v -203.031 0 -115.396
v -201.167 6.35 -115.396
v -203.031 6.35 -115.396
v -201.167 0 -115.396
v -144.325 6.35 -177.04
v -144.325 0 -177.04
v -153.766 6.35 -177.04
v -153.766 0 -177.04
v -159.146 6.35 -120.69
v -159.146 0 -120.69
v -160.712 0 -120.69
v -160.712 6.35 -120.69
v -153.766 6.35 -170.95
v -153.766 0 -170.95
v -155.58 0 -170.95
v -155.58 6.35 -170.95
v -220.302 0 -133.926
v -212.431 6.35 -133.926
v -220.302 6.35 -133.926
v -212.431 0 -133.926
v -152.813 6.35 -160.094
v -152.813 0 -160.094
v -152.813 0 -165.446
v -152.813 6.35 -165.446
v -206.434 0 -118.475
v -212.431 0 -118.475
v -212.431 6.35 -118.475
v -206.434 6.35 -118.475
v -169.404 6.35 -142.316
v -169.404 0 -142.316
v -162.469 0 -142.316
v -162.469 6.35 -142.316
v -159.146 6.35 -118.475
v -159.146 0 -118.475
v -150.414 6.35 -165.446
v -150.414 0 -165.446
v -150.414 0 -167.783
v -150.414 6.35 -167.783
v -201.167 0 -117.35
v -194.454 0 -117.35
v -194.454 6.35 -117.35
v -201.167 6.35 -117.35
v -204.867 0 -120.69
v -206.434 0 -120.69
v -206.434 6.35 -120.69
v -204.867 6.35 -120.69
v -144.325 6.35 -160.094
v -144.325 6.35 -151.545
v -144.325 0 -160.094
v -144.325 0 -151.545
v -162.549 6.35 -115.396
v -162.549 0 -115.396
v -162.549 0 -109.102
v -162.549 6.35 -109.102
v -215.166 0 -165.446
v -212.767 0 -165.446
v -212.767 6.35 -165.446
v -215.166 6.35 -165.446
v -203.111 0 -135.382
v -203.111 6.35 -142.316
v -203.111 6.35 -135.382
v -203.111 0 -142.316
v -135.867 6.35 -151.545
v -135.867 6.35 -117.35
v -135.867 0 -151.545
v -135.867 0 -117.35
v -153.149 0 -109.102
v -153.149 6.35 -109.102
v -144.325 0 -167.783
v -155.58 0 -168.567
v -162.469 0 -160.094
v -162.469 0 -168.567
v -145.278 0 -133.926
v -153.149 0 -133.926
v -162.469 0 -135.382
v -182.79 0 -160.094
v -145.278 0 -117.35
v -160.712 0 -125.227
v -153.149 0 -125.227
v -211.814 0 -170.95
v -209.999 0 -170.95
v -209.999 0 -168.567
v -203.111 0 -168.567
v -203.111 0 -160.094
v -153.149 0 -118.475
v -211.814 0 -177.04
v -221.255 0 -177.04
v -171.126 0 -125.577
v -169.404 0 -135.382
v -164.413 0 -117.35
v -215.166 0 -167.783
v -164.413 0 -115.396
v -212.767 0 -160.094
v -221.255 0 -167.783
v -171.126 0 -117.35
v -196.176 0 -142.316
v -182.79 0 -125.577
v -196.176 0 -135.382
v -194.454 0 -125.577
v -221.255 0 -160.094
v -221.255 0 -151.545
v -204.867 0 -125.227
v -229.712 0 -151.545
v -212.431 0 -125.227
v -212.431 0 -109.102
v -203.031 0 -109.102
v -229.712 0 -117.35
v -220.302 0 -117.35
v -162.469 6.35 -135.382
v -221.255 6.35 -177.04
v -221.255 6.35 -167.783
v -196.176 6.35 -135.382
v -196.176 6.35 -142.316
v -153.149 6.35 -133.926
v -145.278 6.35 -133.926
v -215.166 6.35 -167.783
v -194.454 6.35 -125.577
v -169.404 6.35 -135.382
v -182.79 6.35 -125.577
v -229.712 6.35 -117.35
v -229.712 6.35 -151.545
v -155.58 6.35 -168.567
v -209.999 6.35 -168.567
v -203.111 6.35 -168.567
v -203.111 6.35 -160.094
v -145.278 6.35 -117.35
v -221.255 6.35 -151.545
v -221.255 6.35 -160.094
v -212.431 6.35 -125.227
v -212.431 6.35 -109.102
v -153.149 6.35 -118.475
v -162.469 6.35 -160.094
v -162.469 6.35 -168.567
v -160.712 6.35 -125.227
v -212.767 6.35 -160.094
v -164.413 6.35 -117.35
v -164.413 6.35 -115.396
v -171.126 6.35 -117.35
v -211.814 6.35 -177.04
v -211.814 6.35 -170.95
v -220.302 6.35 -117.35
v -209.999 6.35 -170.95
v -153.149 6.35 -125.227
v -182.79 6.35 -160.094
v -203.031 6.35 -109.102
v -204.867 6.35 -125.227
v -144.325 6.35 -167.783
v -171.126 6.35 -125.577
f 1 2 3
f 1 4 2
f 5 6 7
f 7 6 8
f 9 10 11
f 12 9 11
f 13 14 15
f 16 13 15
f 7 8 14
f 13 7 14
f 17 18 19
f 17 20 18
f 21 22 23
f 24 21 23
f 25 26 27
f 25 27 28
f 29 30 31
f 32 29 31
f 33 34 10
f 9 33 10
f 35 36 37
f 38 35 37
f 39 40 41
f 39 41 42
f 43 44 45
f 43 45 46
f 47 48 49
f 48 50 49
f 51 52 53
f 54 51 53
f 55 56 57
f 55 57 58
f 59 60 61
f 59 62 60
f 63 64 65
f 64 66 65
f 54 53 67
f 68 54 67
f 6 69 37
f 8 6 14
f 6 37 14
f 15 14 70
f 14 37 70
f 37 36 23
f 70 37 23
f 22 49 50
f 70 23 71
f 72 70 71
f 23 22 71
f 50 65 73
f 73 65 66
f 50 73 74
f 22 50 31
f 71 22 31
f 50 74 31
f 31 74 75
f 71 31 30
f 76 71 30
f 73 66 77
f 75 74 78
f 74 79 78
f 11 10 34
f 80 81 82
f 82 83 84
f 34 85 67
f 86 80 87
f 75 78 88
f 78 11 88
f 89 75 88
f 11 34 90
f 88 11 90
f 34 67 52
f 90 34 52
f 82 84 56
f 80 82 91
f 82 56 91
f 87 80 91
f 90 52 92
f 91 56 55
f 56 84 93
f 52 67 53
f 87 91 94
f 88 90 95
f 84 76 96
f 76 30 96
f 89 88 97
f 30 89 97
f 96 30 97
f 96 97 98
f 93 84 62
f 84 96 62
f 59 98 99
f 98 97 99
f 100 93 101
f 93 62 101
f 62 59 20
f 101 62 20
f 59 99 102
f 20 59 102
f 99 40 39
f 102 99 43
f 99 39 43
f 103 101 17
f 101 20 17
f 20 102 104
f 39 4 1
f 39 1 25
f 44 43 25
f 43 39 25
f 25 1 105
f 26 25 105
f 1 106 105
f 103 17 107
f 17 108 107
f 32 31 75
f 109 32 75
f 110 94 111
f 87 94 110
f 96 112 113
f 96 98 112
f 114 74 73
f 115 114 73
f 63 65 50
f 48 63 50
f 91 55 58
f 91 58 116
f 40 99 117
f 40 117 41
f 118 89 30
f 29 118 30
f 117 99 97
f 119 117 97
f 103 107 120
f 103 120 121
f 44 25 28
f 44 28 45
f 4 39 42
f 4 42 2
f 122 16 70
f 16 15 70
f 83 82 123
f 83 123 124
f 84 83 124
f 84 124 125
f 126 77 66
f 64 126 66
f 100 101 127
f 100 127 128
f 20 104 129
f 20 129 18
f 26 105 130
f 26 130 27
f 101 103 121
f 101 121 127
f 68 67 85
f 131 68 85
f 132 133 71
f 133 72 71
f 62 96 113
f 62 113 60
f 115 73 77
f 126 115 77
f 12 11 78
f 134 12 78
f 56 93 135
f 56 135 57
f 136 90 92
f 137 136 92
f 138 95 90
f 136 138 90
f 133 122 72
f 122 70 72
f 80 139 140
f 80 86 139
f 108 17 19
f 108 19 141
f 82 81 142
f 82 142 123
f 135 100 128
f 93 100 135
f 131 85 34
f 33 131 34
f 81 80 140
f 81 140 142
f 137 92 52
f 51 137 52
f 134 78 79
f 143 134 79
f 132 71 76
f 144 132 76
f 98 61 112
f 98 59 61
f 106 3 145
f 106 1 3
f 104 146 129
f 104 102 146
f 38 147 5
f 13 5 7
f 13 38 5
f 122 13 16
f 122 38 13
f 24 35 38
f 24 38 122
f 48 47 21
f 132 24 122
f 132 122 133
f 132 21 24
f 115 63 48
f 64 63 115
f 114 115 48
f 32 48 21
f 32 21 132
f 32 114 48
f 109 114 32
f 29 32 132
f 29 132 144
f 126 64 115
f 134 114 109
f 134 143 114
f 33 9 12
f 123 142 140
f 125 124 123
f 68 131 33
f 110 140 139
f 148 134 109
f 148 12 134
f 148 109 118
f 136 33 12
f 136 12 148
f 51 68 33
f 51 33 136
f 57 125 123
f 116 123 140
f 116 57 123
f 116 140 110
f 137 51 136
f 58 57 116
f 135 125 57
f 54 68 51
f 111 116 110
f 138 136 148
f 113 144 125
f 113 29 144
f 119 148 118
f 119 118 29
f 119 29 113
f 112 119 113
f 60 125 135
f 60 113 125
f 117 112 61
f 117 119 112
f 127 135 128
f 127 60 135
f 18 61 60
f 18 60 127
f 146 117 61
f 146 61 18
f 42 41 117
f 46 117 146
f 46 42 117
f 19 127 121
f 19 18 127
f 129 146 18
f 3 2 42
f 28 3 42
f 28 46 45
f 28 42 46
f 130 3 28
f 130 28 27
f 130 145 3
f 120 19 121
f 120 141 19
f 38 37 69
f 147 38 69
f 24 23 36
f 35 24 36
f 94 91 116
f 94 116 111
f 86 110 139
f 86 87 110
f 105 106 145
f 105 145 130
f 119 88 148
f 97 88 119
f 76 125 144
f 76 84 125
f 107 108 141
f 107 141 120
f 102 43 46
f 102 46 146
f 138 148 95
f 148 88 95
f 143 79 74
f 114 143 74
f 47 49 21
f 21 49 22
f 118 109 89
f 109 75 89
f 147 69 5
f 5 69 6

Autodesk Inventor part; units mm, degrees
ref_plane "YZ Plane" through (0, 0, 0) normal (1, 0, 0) x (0, 1, 0)
ref_plane "XZ Plane" through (0, 0, 0) normal (0, 1, 0) x (-1, 0, 0)
ref_plane "XY Plane" through (0, 0, 0) normal (0, 0, 1) x (1, 0, 0)
sketch "Sketch1" plane through (0, 0, 0) normal (0, 1, 0) x (-1, 0, 0)
  line L0 (0, 0) -> (441.3397, 0) construction
  line L1 (441.3397, 0) -> (441.3397, -197.552) construction
  line L2 (441.3397, -197.552) -> (0, -197.552) construction
  line L3 (0, -197.552) -> (0, 0) construction
  line L4 (171.126, -125.5766) -> (171.126, -117.3504)
  line L5 (171.126, -117.3504) -> (164.413, -117.3504)
  line L6 (164.413, -117.3504) -> (164.413, -115.3958)
  line L7 (164.413, -115.3958) -> (162.5492, -115.3958)
  line L8 (162.5492, -115.3958) -> (162.5492, -109.1021)
  line L9 (162.5492, -109.1021) -> (153.1492, -109.1021)
  line L10 (153.1492, -109.1021) -> (153.1492, -118.4751)
  line L11 (153.1492, -118.4751) -> (159.1458, -118.4751)
  line L12 (159.1458, -118.4751) -> (159.1458, -120.6901)
  line L13 (159.1458, -120.6901) -> (160.7124, -120.6901)
  line L14 (160.7124, -120.6901) -> (160.7124, -125.2266)
  line L15 (160.7124, -125.2266) -> (153.1492, -125.2266)
  line L16 (153.1492, -125.2266) -> (153.1492, -133.9258)
  line L17 (153.1492, -133.9258) -> (145.278, -133.9258)
  line L18 (145.278, -133.9258) -> (145.278, -117.3504)
  line L19 (145.278, -117.3504) -> (135.8674, -117.3504)
  line L20 (135.8674, -117.3504) -> (135.8674, -151.5449)
  line L21 (135.8674, -151.5449) -> (144.3246, -151.5449)
  line L22 (144.3246, -151.5449) -> (144.3246, -160.0944)
  line L23 (144.3246, -160.0944) -> (152.8126, -160.0944)
  line L24 (152.8126, -160.0944) -> (152.8126, -165.4456)
  line L25 (152.8126, -165.4456) -> (150.4138, -165.4456)
  line L26 (150.4138, -165.4456) -> (150.4138, -167.7828)
  line L27 (150.4138, -167.7828) -> (144.3246, -167.7828)
  line L28 (144.3246, -167.7828) -> (144.3246, -177.0397)
  line L29 (144.3246, -177.0397) -> (153.766, -177.0397)
  line L30 (153.766, -177.0397) -> (153.766, -170.9505)
  line L31 (153.766, -170.9505) -> (155.5804, -170.9505)
  line L32 (155.5804, -170.9505) -> (155.5804, -168.5671)
  line L33 (155.5804, -168.5671) -> (162.4692, -168.5671)
  line L34 (162.4692, -168.5671) -> (162.4692, -160.0944)
  line L35 (162.4692, -135.3817) -> (169.4041, -135.3817)
  line L36 (169.4041, -135.3817) -> (169.4041, -142.3165)
  line L37 (169.4041, -142.3165) -> (162.4692, -142.3165)
  line L38 (162.4692, -142.3165) -> (162.4692, -135.3817)
  line L39 (162.4692, -160.0944) -> (182.7899, -160.0944)
  line L40 (171.126, -125.5766) -> (182.7899, -125.5766)
  line L41 (194.4538, -125.5766) -> (194.4538, -117.3504)
  line L42 (194.4538, -117.3504) -> (201.1668, -117.3504)
  line L43 (201.1668, -117.3504) -> (201.1668, -115.3958)
  line L44 (201.1668, -115.3958) -> (203.0306, -115.3958)
  line L45 (203.0306, -115.3958) -> (203.0306, -109.1021)
  line L46 (203.0306, -109.1021) -> (212.4307, -109.1021)
  line L47 (212.4307, -109.1021) -> (212.4307, -118.4751)
  line L48 (212.4307, -118.4751) -> (206.4341, -118.4751)
  line L49 (206.4341, -118.4751) -> (206.4341, -120.6901)
  line L50 (206.4341, -120.6901) -> (204.8674, -120.6901)
  line L51 (204.8674, -120.6901) -> (204.8674, -125.2266)
  line L52 (204.8674, -125.2266) -> (212.4307, -125.2266)
  line L53 (212.4307, -125.2266) -> (212.4307, -133.9258)
  line L54 (212.4307, -133.9258) -> (220.3018, -133.9258)
  line L55 (220.3018, -133.9258) -> (220.3018, -117.3504)
  line L56 (220.3018, -117.3504) -> (229.7124, -117.3504)
  line L57 (229.7124, -117.3504) -> (229.7124, -151.5449)
  line L58 (229.7124, -151.5449) -> (221.2552, -151.5449)
  line L59 (221.2552, -151.5449) -> (221.2552, -160.0944)
  line L60 (221.2552, -160.0944) -> (212.7672, -160.0944)
  line L61 (212.7672, -160.0944) -> (212.7672, -165.4456)
  line L62 (212.7672, -165.4456) -> (215.166, -165.4456)
  line L63 (215.166, -165.4456) -> (215.166, -167.7828)
  line L64 (215.166, -167.7828) -> (221.2552, -167.7828)
  line L65 (221.2552, -167.7828) -> (221.2552, -177.0397)
  line L66 (221.2552, -177.0397) -> (211.8138, -177.0397)
  line L67 (211.8138, -177.0397) -> (211.8138, -170.9505)
  line L68 (211.8138, -170.9505) -> (209.9994, -170.9505)
  line L69 (209.9994, -170.9505) -> (209.9994, -168.5671)
  line L70 (209.9994, -168.5671) -> (203.1106, -168.5671)
  line L71 (203.1106, -168.5671) -> (203.1106, -160.0944)
  line L72 (203.1106, -135.3817) -> (196.1757, -135.3817)
  line L73 (196.1757, -135.3817) -> (196.1757, -142.3165)
  line L74 (196.1757, -142.3165) -> (203.1106, -142.3165)
  line L75 (203.1106, -142.3165) -> (203.1106, -135.3817)
  line L76 (203.1106, -160.0944) -> (182.7899, -160.0944)
  line L77 (194.4538, -125.5766) -> (182.7899, -125.5766)
  dimension "d17" = 90
  dimension "d18" = 6.9349
  dimension "d21" = 6.9349
  dimension "d22" = 26.6019
extrude "Extrusion1" add sketch "Sketch1" along normal blind 6.35
equation "\"d21\" = d18"
properties part number "Monster3"
